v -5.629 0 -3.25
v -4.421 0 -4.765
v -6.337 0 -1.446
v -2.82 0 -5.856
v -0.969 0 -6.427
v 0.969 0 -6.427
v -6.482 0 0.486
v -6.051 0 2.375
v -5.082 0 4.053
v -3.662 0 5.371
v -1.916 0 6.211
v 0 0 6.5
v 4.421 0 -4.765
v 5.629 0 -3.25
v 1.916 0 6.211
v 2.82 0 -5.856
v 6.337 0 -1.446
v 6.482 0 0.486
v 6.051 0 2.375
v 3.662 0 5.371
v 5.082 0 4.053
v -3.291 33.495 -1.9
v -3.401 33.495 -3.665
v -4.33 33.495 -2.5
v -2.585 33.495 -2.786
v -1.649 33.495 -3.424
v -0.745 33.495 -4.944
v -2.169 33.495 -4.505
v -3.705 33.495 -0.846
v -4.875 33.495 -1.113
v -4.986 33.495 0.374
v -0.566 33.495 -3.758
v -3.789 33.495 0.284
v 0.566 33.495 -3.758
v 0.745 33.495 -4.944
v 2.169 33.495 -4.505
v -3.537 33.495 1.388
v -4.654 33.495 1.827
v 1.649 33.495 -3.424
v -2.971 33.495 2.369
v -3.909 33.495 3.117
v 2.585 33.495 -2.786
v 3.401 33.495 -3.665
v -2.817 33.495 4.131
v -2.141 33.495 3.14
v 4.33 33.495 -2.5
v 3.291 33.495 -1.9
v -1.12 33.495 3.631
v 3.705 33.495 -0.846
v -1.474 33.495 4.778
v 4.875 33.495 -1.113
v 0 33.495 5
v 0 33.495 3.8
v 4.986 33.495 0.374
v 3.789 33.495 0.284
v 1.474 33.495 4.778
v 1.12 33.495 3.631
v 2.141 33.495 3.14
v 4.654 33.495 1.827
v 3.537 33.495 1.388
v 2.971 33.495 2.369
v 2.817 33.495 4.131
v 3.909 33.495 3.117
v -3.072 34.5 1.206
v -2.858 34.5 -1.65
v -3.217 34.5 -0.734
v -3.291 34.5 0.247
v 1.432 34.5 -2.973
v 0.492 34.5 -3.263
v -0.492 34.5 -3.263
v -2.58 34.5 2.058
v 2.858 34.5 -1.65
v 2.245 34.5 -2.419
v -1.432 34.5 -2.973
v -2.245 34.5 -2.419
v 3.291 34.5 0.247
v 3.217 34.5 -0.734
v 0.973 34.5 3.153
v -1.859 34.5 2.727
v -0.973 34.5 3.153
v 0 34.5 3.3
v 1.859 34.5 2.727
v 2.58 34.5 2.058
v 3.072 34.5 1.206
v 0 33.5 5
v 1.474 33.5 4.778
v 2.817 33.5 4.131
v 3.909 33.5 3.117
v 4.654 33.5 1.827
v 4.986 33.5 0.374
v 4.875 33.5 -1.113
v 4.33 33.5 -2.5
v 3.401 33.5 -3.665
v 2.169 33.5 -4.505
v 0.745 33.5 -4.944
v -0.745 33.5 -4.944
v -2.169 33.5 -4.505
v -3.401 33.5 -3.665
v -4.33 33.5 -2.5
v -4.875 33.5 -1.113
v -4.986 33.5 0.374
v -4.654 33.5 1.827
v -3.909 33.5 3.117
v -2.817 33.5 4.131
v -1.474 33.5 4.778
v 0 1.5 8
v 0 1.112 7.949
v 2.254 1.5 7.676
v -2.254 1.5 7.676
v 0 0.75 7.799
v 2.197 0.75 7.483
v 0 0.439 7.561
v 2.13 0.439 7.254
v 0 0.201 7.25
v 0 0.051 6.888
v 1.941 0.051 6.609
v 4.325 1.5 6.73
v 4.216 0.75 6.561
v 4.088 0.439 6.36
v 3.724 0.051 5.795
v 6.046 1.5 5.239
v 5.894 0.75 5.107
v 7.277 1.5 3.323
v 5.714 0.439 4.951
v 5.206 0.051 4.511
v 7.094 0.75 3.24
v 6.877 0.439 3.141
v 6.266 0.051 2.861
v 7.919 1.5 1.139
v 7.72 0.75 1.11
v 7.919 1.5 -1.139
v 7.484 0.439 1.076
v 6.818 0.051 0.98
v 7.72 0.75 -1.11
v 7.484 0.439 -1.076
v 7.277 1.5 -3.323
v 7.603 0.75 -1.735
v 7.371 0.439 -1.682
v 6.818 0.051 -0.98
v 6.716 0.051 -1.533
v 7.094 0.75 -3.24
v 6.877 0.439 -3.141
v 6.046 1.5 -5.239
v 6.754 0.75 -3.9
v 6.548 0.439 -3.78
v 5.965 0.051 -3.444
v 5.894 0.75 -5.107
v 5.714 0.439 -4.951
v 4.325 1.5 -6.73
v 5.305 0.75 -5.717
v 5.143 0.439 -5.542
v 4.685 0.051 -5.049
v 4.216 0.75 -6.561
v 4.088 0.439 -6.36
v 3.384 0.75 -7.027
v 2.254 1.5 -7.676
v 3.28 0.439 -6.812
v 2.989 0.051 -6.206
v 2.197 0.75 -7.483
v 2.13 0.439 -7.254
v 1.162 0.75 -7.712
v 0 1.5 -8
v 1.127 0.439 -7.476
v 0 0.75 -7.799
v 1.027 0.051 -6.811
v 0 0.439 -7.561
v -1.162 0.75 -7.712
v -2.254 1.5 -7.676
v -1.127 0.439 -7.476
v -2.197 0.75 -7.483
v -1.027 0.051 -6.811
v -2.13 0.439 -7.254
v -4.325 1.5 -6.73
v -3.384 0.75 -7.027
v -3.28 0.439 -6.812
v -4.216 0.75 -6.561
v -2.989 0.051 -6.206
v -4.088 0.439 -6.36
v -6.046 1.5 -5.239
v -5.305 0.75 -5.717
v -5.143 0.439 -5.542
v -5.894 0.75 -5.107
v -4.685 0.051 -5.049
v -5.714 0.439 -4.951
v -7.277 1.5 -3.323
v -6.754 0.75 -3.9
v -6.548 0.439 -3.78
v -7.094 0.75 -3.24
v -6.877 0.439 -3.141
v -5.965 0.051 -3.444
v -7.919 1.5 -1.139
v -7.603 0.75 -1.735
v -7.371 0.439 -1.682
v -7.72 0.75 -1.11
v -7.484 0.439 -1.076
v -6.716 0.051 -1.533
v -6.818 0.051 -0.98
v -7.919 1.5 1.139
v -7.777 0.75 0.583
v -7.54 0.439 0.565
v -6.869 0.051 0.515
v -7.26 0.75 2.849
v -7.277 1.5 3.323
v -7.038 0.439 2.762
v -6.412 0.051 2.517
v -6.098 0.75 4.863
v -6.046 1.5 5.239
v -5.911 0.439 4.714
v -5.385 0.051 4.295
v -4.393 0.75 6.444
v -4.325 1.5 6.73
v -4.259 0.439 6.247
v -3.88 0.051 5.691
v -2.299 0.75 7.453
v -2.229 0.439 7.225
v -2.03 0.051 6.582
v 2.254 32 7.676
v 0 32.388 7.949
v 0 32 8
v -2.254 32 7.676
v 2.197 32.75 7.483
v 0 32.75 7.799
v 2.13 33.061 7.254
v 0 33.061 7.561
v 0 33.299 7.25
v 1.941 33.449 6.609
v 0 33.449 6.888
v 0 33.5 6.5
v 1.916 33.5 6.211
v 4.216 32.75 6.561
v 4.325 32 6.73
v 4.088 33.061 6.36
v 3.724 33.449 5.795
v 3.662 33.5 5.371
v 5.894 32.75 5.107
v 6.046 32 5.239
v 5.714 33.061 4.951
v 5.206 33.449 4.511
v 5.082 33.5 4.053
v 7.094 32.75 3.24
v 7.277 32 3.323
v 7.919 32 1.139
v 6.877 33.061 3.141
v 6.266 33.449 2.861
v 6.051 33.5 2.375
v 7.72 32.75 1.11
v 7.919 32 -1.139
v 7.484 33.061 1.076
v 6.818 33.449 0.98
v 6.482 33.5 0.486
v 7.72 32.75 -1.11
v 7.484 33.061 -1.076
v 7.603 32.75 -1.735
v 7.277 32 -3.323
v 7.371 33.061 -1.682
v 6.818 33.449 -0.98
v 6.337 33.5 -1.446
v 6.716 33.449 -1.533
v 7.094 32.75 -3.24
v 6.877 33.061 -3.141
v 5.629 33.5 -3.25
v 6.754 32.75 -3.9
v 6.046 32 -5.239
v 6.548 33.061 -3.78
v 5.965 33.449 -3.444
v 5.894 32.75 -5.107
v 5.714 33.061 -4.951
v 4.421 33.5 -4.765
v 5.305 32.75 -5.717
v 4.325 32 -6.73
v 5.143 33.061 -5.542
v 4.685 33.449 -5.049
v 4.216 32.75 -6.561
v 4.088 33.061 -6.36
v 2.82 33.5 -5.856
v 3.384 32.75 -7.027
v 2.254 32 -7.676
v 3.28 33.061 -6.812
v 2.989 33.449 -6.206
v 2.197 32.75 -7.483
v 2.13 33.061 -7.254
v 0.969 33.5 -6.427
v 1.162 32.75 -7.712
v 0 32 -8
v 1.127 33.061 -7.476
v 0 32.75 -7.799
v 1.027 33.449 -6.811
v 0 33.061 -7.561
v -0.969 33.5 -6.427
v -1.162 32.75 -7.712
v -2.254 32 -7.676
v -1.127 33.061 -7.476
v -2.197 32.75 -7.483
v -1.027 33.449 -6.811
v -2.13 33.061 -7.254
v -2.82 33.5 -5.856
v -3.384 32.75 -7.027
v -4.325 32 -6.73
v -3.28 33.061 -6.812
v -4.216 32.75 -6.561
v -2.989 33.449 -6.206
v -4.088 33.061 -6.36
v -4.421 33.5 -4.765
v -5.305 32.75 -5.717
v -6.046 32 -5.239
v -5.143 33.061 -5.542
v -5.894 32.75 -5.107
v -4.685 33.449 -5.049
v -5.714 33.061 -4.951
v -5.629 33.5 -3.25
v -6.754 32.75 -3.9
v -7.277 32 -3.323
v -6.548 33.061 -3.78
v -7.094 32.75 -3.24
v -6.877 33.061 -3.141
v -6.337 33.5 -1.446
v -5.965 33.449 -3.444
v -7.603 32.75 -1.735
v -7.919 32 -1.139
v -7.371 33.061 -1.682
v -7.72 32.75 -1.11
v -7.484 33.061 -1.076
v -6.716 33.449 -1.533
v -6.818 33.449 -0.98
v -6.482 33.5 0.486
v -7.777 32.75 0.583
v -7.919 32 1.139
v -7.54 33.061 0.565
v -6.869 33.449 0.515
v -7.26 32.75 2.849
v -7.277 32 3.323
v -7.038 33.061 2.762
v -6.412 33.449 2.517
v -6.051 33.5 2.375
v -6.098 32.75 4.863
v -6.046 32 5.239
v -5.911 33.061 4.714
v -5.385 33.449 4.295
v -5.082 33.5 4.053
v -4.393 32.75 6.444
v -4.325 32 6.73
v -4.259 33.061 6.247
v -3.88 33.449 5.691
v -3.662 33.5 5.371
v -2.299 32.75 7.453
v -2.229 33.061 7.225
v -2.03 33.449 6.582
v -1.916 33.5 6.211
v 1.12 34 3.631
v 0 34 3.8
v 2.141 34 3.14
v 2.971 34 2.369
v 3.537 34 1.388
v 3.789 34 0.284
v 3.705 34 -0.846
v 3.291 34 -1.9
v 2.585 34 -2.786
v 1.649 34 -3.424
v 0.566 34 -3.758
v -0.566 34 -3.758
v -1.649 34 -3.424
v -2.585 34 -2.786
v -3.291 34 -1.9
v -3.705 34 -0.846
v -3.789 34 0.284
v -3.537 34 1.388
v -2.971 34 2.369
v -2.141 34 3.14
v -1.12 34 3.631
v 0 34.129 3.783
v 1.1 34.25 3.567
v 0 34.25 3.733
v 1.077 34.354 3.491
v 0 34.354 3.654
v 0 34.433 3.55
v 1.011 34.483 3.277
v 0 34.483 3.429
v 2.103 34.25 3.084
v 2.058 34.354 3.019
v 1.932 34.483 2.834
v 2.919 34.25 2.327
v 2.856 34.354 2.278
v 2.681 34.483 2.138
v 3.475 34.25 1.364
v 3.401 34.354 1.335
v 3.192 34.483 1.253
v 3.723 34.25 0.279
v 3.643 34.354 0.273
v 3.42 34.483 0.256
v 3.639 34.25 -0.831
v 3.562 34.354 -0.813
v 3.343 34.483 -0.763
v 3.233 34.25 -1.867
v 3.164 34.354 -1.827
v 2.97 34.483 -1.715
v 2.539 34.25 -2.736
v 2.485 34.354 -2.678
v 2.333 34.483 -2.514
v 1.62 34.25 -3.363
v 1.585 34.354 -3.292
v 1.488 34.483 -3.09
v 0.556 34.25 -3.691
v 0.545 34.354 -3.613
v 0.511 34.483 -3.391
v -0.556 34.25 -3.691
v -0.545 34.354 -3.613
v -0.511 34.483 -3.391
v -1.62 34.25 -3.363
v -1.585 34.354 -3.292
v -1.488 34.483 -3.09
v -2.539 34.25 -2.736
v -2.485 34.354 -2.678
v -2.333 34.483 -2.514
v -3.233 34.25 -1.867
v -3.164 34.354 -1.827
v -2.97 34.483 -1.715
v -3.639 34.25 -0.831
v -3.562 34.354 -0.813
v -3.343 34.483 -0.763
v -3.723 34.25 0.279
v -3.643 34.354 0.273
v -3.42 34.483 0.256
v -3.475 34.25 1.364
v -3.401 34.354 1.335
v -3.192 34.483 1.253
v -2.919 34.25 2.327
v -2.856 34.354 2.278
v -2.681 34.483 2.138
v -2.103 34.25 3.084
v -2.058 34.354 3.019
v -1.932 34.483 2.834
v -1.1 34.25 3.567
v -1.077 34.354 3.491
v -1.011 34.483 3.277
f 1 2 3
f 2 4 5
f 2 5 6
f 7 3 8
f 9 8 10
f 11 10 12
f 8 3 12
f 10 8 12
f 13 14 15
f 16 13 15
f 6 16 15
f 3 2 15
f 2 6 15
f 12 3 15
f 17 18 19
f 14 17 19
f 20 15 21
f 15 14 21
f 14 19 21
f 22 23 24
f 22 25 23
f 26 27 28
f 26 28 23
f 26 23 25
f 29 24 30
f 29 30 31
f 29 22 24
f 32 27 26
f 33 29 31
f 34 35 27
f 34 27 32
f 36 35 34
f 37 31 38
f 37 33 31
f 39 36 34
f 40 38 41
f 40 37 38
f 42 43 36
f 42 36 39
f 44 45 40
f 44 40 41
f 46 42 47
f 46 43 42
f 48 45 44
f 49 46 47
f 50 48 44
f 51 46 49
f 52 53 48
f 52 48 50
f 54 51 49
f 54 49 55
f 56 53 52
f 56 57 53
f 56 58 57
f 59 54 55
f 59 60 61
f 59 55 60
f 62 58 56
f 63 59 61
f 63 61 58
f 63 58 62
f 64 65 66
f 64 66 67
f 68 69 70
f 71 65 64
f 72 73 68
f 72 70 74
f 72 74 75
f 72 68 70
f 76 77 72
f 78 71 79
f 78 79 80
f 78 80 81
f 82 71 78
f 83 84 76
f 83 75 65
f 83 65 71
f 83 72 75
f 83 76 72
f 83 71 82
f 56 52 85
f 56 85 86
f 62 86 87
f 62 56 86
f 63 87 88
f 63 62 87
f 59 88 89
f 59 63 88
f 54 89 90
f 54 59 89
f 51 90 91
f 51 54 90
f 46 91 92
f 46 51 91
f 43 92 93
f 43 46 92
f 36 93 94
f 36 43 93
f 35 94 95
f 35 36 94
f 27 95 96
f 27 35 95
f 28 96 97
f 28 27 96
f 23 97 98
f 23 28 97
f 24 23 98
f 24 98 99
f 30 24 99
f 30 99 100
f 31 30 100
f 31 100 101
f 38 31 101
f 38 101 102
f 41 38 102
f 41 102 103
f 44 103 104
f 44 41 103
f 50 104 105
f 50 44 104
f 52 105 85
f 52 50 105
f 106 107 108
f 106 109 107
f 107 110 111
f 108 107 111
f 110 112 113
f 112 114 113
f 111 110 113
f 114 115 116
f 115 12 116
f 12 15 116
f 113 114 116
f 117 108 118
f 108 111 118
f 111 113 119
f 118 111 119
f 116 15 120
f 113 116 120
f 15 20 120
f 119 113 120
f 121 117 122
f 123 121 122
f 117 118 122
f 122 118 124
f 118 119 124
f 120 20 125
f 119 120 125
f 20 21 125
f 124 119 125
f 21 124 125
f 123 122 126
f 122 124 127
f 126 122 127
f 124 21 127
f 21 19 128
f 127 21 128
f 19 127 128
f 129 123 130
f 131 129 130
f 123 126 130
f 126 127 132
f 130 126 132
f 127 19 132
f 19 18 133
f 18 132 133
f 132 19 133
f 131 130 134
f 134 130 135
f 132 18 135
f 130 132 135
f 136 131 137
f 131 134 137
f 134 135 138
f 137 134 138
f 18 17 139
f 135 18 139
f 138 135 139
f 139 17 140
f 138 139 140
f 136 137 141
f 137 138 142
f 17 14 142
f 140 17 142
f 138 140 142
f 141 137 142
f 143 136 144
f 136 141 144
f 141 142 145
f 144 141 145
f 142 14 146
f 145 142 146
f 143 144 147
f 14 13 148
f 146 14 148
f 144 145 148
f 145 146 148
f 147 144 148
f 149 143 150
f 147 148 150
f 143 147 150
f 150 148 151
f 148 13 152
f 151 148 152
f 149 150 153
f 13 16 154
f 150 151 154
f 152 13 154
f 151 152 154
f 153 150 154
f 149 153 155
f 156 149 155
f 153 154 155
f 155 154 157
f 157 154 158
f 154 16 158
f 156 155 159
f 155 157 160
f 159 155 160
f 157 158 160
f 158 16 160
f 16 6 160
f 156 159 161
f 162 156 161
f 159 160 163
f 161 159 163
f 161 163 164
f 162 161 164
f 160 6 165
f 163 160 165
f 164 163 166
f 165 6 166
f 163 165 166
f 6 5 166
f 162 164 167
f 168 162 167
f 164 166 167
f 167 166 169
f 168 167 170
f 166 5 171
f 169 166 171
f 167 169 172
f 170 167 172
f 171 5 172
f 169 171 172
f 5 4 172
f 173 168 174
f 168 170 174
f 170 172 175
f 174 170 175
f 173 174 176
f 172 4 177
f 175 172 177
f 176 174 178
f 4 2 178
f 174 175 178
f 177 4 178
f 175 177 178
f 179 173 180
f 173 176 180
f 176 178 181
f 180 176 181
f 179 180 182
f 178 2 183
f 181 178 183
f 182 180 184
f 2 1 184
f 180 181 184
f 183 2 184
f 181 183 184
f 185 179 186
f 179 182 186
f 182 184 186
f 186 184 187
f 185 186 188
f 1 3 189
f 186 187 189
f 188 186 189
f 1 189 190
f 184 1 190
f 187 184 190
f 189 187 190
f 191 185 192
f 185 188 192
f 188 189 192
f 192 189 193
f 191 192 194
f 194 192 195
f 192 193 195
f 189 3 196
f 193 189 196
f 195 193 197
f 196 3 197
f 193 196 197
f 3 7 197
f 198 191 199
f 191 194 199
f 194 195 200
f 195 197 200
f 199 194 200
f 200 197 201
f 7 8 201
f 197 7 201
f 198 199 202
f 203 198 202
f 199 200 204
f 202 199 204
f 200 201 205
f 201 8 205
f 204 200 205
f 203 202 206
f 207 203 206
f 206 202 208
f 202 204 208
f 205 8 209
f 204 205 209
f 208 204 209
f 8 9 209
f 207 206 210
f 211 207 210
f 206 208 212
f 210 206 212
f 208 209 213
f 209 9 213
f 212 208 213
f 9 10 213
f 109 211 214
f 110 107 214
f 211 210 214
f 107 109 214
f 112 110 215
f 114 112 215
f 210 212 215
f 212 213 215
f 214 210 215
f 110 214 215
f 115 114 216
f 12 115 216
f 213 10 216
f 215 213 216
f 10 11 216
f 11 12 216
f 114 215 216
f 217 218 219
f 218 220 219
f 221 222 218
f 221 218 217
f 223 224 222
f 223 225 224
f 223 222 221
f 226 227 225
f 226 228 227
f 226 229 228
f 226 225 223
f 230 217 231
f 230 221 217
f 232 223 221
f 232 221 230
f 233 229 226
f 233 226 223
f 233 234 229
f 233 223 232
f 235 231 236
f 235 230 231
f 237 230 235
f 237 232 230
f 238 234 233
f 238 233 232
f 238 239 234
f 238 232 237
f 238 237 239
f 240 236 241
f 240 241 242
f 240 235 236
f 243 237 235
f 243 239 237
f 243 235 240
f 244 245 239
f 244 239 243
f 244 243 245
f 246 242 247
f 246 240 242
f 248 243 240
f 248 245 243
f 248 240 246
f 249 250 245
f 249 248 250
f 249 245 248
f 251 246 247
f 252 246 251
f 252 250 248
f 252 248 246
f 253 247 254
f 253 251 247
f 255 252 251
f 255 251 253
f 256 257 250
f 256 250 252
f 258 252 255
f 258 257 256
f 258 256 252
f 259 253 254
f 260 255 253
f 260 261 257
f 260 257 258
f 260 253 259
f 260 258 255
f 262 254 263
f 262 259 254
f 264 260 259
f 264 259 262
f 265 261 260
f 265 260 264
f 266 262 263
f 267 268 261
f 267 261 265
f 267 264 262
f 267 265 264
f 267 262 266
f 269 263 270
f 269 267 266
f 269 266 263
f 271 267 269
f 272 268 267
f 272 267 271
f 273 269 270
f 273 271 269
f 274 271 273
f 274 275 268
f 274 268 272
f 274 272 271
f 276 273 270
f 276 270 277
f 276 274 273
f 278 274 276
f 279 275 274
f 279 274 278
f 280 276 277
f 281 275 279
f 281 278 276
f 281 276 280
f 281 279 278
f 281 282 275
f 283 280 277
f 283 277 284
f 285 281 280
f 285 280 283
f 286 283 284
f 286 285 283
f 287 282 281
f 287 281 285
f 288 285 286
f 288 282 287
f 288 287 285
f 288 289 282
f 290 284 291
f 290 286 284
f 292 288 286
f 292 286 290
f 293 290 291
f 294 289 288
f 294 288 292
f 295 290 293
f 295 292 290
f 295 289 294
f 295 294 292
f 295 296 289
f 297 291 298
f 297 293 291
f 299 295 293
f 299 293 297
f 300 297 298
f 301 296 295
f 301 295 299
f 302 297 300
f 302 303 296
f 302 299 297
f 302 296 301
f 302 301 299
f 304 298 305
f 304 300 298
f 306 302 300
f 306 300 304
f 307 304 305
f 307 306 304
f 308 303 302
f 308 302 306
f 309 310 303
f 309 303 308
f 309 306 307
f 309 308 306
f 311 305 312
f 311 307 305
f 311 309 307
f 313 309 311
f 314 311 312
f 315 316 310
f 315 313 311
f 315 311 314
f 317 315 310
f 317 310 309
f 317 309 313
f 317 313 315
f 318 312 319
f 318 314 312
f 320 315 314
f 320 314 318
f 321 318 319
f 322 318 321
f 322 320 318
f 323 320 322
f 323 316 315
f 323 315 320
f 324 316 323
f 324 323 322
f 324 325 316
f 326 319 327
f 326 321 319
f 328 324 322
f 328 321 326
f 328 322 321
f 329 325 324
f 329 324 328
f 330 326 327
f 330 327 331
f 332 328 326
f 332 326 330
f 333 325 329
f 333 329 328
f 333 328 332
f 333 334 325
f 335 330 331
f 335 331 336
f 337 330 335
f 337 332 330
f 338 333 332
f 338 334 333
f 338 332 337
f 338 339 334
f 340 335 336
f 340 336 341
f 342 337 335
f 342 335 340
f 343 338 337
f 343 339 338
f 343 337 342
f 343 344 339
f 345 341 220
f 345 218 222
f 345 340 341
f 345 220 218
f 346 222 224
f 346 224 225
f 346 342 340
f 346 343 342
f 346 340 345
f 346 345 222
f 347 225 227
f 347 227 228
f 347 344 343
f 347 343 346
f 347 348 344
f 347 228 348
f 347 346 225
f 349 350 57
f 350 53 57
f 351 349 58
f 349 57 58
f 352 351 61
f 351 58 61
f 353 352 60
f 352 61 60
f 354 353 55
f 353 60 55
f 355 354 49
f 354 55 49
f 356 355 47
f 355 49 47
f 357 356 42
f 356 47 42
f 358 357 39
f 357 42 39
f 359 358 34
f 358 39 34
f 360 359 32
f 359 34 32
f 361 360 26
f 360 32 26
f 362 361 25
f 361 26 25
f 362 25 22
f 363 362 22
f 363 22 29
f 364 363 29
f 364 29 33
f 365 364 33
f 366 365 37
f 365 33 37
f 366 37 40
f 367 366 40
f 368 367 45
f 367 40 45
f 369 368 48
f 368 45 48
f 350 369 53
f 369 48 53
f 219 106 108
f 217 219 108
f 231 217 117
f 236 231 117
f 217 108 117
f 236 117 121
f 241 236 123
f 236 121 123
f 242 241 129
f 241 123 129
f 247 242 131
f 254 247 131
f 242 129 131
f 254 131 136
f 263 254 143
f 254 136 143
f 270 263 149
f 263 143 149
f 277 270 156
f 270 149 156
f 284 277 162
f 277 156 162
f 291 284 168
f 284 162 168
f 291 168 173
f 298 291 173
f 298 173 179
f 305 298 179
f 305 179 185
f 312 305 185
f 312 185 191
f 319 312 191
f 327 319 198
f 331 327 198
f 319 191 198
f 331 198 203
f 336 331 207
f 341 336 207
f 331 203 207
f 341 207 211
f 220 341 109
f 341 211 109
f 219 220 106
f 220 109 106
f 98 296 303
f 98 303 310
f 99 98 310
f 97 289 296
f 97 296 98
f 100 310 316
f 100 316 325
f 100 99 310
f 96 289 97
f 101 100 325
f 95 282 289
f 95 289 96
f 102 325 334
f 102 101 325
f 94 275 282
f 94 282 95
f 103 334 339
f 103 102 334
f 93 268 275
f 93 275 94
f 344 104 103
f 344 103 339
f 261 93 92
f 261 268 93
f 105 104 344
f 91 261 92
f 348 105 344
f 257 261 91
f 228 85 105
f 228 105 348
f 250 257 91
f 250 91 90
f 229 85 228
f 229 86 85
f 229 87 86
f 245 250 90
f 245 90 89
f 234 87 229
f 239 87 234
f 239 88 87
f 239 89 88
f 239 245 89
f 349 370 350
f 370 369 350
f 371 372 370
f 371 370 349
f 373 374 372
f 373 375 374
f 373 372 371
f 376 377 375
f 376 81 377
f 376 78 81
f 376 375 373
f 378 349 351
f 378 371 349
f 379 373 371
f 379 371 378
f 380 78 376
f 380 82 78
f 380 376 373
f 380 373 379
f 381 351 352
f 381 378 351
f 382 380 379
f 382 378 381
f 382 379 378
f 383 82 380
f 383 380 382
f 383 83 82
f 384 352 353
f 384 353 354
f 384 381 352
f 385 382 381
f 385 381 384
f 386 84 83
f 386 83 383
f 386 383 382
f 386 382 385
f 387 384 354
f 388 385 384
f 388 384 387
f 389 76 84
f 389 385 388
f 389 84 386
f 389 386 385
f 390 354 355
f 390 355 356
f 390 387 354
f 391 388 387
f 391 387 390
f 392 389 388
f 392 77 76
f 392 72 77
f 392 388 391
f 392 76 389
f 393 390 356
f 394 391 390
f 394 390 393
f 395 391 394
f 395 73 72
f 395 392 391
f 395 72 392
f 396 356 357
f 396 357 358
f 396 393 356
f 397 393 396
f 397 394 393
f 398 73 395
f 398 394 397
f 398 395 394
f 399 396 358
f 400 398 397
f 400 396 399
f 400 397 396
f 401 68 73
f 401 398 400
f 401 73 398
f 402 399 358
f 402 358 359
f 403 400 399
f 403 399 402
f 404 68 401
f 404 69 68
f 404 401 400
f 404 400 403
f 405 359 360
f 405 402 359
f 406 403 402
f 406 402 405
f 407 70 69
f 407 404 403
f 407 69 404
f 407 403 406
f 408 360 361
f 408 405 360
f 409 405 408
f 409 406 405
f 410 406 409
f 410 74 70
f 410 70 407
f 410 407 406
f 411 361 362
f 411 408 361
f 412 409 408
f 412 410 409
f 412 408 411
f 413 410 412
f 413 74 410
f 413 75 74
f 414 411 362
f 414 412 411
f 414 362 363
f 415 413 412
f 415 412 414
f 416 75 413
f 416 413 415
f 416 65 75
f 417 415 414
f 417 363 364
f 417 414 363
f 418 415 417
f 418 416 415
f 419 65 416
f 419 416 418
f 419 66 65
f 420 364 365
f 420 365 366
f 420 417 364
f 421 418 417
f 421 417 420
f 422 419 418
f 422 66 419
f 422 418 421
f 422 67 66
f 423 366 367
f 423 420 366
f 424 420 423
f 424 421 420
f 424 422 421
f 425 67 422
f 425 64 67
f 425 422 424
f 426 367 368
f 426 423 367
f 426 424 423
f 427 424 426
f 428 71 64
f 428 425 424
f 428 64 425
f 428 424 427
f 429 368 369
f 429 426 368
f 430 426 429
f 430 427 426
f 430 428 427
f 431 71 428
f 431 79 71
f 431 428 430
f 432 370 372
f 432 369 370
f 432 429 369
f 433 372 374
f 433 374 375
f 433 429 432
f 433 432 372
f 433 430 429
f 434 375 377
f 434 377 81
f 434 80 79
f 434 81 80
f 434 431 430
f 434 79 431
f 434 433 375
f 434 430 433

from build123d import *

# Parameters (mm, degrees)
SKIZZE1_R                       = 8
AUFSATZ_LINEAR_AUSTRAGEN1_DEPTH = 33.5
SKIZZE2_R                       = 3.799988553
AUFSATZ_LINEAR_AUSTRAGEN2_DEPTH = 1
VERRUNDUNG1_R                   = 1.5
VERRUNDUNG2_R                   = 0.5
SCHNITT_LINEAR_START            = -0.005
SKIZZE3_R                       = 5
SKIZZE3_R_2                     = 3.799988553
SCHNITT_LINEAR_AUSTRAGEN1_DEPTH = 0.005


with BuildPart() as part:
    # Skizze1 → Aufsatz-Linear austragen1 (new body)
    with BuildSketch(Plane(origin=(0, 0, 0), x_dir=(1, 0, 0), z_dir=(0, 1, 0))):
        with Locations(Location((0, 0, 0), (0, 0, 270))):
            Circle(SKIZZE1_R)
    extrude(amount=AUFSATZ_LINEAR_AUSTRAGEN1_DEPTH)

    # Skizze2 → Aufsatz-Linear austragen2 (add)
    with BuildSketch(Plane(origin=(0, 33.5, 0), x_dir=(1, 0, 0), z_dir=(0, 1, 0))):
        with Locations(Location((0, 0, 0), (0, 0, 270))):
            Circle(SKIZZE2_R)
    extrude(amount=AUFSATZ_LINEAR_AUSTRAGEN2_DEPTH)

    # Verrundung1
    verrundung1_edges = [part.edges().sort_by_distance(p)[0] for p in [
        (0, 0, -8),
        (0, 33.5, -8),
    ]]
    fillet(verrundung1_edges, radius=VERRUNDUNG1_R)

    # Verrundung2
    verrundung2_edges = [part.edges().sort_by_distance(p)[0] for p in [
        (0, 34.5, -3.799988553),
    ]]
    fillet(verrundung2_edges, radius=VERRUNDUNG2_R)

    # Skizze3 → Schnitt-Linear austragen1 (cut)
    with BuildSketch(Plane(origin=(0, 33.5, 0), x_dir=(1, 0, 0), z_dir=(0, 1, 0)).offset(SCHNITT_LINEAR_START)):
        with Locations(Location((0, 0, 0), (0, 0, 270))):
            Circle(SKIZZE3_R)
        with Locations(Location((0, 0, 0), (0, 0, 270))):
            Circle(SKIZZE3_R_2, mode=Mode.SUBTRACT)
    extrude(amount=SCHNITT_LINEAR_AUSTRAGEN1_DEPTH, mode=Mode.SUBTRACT)


solid = part.part
